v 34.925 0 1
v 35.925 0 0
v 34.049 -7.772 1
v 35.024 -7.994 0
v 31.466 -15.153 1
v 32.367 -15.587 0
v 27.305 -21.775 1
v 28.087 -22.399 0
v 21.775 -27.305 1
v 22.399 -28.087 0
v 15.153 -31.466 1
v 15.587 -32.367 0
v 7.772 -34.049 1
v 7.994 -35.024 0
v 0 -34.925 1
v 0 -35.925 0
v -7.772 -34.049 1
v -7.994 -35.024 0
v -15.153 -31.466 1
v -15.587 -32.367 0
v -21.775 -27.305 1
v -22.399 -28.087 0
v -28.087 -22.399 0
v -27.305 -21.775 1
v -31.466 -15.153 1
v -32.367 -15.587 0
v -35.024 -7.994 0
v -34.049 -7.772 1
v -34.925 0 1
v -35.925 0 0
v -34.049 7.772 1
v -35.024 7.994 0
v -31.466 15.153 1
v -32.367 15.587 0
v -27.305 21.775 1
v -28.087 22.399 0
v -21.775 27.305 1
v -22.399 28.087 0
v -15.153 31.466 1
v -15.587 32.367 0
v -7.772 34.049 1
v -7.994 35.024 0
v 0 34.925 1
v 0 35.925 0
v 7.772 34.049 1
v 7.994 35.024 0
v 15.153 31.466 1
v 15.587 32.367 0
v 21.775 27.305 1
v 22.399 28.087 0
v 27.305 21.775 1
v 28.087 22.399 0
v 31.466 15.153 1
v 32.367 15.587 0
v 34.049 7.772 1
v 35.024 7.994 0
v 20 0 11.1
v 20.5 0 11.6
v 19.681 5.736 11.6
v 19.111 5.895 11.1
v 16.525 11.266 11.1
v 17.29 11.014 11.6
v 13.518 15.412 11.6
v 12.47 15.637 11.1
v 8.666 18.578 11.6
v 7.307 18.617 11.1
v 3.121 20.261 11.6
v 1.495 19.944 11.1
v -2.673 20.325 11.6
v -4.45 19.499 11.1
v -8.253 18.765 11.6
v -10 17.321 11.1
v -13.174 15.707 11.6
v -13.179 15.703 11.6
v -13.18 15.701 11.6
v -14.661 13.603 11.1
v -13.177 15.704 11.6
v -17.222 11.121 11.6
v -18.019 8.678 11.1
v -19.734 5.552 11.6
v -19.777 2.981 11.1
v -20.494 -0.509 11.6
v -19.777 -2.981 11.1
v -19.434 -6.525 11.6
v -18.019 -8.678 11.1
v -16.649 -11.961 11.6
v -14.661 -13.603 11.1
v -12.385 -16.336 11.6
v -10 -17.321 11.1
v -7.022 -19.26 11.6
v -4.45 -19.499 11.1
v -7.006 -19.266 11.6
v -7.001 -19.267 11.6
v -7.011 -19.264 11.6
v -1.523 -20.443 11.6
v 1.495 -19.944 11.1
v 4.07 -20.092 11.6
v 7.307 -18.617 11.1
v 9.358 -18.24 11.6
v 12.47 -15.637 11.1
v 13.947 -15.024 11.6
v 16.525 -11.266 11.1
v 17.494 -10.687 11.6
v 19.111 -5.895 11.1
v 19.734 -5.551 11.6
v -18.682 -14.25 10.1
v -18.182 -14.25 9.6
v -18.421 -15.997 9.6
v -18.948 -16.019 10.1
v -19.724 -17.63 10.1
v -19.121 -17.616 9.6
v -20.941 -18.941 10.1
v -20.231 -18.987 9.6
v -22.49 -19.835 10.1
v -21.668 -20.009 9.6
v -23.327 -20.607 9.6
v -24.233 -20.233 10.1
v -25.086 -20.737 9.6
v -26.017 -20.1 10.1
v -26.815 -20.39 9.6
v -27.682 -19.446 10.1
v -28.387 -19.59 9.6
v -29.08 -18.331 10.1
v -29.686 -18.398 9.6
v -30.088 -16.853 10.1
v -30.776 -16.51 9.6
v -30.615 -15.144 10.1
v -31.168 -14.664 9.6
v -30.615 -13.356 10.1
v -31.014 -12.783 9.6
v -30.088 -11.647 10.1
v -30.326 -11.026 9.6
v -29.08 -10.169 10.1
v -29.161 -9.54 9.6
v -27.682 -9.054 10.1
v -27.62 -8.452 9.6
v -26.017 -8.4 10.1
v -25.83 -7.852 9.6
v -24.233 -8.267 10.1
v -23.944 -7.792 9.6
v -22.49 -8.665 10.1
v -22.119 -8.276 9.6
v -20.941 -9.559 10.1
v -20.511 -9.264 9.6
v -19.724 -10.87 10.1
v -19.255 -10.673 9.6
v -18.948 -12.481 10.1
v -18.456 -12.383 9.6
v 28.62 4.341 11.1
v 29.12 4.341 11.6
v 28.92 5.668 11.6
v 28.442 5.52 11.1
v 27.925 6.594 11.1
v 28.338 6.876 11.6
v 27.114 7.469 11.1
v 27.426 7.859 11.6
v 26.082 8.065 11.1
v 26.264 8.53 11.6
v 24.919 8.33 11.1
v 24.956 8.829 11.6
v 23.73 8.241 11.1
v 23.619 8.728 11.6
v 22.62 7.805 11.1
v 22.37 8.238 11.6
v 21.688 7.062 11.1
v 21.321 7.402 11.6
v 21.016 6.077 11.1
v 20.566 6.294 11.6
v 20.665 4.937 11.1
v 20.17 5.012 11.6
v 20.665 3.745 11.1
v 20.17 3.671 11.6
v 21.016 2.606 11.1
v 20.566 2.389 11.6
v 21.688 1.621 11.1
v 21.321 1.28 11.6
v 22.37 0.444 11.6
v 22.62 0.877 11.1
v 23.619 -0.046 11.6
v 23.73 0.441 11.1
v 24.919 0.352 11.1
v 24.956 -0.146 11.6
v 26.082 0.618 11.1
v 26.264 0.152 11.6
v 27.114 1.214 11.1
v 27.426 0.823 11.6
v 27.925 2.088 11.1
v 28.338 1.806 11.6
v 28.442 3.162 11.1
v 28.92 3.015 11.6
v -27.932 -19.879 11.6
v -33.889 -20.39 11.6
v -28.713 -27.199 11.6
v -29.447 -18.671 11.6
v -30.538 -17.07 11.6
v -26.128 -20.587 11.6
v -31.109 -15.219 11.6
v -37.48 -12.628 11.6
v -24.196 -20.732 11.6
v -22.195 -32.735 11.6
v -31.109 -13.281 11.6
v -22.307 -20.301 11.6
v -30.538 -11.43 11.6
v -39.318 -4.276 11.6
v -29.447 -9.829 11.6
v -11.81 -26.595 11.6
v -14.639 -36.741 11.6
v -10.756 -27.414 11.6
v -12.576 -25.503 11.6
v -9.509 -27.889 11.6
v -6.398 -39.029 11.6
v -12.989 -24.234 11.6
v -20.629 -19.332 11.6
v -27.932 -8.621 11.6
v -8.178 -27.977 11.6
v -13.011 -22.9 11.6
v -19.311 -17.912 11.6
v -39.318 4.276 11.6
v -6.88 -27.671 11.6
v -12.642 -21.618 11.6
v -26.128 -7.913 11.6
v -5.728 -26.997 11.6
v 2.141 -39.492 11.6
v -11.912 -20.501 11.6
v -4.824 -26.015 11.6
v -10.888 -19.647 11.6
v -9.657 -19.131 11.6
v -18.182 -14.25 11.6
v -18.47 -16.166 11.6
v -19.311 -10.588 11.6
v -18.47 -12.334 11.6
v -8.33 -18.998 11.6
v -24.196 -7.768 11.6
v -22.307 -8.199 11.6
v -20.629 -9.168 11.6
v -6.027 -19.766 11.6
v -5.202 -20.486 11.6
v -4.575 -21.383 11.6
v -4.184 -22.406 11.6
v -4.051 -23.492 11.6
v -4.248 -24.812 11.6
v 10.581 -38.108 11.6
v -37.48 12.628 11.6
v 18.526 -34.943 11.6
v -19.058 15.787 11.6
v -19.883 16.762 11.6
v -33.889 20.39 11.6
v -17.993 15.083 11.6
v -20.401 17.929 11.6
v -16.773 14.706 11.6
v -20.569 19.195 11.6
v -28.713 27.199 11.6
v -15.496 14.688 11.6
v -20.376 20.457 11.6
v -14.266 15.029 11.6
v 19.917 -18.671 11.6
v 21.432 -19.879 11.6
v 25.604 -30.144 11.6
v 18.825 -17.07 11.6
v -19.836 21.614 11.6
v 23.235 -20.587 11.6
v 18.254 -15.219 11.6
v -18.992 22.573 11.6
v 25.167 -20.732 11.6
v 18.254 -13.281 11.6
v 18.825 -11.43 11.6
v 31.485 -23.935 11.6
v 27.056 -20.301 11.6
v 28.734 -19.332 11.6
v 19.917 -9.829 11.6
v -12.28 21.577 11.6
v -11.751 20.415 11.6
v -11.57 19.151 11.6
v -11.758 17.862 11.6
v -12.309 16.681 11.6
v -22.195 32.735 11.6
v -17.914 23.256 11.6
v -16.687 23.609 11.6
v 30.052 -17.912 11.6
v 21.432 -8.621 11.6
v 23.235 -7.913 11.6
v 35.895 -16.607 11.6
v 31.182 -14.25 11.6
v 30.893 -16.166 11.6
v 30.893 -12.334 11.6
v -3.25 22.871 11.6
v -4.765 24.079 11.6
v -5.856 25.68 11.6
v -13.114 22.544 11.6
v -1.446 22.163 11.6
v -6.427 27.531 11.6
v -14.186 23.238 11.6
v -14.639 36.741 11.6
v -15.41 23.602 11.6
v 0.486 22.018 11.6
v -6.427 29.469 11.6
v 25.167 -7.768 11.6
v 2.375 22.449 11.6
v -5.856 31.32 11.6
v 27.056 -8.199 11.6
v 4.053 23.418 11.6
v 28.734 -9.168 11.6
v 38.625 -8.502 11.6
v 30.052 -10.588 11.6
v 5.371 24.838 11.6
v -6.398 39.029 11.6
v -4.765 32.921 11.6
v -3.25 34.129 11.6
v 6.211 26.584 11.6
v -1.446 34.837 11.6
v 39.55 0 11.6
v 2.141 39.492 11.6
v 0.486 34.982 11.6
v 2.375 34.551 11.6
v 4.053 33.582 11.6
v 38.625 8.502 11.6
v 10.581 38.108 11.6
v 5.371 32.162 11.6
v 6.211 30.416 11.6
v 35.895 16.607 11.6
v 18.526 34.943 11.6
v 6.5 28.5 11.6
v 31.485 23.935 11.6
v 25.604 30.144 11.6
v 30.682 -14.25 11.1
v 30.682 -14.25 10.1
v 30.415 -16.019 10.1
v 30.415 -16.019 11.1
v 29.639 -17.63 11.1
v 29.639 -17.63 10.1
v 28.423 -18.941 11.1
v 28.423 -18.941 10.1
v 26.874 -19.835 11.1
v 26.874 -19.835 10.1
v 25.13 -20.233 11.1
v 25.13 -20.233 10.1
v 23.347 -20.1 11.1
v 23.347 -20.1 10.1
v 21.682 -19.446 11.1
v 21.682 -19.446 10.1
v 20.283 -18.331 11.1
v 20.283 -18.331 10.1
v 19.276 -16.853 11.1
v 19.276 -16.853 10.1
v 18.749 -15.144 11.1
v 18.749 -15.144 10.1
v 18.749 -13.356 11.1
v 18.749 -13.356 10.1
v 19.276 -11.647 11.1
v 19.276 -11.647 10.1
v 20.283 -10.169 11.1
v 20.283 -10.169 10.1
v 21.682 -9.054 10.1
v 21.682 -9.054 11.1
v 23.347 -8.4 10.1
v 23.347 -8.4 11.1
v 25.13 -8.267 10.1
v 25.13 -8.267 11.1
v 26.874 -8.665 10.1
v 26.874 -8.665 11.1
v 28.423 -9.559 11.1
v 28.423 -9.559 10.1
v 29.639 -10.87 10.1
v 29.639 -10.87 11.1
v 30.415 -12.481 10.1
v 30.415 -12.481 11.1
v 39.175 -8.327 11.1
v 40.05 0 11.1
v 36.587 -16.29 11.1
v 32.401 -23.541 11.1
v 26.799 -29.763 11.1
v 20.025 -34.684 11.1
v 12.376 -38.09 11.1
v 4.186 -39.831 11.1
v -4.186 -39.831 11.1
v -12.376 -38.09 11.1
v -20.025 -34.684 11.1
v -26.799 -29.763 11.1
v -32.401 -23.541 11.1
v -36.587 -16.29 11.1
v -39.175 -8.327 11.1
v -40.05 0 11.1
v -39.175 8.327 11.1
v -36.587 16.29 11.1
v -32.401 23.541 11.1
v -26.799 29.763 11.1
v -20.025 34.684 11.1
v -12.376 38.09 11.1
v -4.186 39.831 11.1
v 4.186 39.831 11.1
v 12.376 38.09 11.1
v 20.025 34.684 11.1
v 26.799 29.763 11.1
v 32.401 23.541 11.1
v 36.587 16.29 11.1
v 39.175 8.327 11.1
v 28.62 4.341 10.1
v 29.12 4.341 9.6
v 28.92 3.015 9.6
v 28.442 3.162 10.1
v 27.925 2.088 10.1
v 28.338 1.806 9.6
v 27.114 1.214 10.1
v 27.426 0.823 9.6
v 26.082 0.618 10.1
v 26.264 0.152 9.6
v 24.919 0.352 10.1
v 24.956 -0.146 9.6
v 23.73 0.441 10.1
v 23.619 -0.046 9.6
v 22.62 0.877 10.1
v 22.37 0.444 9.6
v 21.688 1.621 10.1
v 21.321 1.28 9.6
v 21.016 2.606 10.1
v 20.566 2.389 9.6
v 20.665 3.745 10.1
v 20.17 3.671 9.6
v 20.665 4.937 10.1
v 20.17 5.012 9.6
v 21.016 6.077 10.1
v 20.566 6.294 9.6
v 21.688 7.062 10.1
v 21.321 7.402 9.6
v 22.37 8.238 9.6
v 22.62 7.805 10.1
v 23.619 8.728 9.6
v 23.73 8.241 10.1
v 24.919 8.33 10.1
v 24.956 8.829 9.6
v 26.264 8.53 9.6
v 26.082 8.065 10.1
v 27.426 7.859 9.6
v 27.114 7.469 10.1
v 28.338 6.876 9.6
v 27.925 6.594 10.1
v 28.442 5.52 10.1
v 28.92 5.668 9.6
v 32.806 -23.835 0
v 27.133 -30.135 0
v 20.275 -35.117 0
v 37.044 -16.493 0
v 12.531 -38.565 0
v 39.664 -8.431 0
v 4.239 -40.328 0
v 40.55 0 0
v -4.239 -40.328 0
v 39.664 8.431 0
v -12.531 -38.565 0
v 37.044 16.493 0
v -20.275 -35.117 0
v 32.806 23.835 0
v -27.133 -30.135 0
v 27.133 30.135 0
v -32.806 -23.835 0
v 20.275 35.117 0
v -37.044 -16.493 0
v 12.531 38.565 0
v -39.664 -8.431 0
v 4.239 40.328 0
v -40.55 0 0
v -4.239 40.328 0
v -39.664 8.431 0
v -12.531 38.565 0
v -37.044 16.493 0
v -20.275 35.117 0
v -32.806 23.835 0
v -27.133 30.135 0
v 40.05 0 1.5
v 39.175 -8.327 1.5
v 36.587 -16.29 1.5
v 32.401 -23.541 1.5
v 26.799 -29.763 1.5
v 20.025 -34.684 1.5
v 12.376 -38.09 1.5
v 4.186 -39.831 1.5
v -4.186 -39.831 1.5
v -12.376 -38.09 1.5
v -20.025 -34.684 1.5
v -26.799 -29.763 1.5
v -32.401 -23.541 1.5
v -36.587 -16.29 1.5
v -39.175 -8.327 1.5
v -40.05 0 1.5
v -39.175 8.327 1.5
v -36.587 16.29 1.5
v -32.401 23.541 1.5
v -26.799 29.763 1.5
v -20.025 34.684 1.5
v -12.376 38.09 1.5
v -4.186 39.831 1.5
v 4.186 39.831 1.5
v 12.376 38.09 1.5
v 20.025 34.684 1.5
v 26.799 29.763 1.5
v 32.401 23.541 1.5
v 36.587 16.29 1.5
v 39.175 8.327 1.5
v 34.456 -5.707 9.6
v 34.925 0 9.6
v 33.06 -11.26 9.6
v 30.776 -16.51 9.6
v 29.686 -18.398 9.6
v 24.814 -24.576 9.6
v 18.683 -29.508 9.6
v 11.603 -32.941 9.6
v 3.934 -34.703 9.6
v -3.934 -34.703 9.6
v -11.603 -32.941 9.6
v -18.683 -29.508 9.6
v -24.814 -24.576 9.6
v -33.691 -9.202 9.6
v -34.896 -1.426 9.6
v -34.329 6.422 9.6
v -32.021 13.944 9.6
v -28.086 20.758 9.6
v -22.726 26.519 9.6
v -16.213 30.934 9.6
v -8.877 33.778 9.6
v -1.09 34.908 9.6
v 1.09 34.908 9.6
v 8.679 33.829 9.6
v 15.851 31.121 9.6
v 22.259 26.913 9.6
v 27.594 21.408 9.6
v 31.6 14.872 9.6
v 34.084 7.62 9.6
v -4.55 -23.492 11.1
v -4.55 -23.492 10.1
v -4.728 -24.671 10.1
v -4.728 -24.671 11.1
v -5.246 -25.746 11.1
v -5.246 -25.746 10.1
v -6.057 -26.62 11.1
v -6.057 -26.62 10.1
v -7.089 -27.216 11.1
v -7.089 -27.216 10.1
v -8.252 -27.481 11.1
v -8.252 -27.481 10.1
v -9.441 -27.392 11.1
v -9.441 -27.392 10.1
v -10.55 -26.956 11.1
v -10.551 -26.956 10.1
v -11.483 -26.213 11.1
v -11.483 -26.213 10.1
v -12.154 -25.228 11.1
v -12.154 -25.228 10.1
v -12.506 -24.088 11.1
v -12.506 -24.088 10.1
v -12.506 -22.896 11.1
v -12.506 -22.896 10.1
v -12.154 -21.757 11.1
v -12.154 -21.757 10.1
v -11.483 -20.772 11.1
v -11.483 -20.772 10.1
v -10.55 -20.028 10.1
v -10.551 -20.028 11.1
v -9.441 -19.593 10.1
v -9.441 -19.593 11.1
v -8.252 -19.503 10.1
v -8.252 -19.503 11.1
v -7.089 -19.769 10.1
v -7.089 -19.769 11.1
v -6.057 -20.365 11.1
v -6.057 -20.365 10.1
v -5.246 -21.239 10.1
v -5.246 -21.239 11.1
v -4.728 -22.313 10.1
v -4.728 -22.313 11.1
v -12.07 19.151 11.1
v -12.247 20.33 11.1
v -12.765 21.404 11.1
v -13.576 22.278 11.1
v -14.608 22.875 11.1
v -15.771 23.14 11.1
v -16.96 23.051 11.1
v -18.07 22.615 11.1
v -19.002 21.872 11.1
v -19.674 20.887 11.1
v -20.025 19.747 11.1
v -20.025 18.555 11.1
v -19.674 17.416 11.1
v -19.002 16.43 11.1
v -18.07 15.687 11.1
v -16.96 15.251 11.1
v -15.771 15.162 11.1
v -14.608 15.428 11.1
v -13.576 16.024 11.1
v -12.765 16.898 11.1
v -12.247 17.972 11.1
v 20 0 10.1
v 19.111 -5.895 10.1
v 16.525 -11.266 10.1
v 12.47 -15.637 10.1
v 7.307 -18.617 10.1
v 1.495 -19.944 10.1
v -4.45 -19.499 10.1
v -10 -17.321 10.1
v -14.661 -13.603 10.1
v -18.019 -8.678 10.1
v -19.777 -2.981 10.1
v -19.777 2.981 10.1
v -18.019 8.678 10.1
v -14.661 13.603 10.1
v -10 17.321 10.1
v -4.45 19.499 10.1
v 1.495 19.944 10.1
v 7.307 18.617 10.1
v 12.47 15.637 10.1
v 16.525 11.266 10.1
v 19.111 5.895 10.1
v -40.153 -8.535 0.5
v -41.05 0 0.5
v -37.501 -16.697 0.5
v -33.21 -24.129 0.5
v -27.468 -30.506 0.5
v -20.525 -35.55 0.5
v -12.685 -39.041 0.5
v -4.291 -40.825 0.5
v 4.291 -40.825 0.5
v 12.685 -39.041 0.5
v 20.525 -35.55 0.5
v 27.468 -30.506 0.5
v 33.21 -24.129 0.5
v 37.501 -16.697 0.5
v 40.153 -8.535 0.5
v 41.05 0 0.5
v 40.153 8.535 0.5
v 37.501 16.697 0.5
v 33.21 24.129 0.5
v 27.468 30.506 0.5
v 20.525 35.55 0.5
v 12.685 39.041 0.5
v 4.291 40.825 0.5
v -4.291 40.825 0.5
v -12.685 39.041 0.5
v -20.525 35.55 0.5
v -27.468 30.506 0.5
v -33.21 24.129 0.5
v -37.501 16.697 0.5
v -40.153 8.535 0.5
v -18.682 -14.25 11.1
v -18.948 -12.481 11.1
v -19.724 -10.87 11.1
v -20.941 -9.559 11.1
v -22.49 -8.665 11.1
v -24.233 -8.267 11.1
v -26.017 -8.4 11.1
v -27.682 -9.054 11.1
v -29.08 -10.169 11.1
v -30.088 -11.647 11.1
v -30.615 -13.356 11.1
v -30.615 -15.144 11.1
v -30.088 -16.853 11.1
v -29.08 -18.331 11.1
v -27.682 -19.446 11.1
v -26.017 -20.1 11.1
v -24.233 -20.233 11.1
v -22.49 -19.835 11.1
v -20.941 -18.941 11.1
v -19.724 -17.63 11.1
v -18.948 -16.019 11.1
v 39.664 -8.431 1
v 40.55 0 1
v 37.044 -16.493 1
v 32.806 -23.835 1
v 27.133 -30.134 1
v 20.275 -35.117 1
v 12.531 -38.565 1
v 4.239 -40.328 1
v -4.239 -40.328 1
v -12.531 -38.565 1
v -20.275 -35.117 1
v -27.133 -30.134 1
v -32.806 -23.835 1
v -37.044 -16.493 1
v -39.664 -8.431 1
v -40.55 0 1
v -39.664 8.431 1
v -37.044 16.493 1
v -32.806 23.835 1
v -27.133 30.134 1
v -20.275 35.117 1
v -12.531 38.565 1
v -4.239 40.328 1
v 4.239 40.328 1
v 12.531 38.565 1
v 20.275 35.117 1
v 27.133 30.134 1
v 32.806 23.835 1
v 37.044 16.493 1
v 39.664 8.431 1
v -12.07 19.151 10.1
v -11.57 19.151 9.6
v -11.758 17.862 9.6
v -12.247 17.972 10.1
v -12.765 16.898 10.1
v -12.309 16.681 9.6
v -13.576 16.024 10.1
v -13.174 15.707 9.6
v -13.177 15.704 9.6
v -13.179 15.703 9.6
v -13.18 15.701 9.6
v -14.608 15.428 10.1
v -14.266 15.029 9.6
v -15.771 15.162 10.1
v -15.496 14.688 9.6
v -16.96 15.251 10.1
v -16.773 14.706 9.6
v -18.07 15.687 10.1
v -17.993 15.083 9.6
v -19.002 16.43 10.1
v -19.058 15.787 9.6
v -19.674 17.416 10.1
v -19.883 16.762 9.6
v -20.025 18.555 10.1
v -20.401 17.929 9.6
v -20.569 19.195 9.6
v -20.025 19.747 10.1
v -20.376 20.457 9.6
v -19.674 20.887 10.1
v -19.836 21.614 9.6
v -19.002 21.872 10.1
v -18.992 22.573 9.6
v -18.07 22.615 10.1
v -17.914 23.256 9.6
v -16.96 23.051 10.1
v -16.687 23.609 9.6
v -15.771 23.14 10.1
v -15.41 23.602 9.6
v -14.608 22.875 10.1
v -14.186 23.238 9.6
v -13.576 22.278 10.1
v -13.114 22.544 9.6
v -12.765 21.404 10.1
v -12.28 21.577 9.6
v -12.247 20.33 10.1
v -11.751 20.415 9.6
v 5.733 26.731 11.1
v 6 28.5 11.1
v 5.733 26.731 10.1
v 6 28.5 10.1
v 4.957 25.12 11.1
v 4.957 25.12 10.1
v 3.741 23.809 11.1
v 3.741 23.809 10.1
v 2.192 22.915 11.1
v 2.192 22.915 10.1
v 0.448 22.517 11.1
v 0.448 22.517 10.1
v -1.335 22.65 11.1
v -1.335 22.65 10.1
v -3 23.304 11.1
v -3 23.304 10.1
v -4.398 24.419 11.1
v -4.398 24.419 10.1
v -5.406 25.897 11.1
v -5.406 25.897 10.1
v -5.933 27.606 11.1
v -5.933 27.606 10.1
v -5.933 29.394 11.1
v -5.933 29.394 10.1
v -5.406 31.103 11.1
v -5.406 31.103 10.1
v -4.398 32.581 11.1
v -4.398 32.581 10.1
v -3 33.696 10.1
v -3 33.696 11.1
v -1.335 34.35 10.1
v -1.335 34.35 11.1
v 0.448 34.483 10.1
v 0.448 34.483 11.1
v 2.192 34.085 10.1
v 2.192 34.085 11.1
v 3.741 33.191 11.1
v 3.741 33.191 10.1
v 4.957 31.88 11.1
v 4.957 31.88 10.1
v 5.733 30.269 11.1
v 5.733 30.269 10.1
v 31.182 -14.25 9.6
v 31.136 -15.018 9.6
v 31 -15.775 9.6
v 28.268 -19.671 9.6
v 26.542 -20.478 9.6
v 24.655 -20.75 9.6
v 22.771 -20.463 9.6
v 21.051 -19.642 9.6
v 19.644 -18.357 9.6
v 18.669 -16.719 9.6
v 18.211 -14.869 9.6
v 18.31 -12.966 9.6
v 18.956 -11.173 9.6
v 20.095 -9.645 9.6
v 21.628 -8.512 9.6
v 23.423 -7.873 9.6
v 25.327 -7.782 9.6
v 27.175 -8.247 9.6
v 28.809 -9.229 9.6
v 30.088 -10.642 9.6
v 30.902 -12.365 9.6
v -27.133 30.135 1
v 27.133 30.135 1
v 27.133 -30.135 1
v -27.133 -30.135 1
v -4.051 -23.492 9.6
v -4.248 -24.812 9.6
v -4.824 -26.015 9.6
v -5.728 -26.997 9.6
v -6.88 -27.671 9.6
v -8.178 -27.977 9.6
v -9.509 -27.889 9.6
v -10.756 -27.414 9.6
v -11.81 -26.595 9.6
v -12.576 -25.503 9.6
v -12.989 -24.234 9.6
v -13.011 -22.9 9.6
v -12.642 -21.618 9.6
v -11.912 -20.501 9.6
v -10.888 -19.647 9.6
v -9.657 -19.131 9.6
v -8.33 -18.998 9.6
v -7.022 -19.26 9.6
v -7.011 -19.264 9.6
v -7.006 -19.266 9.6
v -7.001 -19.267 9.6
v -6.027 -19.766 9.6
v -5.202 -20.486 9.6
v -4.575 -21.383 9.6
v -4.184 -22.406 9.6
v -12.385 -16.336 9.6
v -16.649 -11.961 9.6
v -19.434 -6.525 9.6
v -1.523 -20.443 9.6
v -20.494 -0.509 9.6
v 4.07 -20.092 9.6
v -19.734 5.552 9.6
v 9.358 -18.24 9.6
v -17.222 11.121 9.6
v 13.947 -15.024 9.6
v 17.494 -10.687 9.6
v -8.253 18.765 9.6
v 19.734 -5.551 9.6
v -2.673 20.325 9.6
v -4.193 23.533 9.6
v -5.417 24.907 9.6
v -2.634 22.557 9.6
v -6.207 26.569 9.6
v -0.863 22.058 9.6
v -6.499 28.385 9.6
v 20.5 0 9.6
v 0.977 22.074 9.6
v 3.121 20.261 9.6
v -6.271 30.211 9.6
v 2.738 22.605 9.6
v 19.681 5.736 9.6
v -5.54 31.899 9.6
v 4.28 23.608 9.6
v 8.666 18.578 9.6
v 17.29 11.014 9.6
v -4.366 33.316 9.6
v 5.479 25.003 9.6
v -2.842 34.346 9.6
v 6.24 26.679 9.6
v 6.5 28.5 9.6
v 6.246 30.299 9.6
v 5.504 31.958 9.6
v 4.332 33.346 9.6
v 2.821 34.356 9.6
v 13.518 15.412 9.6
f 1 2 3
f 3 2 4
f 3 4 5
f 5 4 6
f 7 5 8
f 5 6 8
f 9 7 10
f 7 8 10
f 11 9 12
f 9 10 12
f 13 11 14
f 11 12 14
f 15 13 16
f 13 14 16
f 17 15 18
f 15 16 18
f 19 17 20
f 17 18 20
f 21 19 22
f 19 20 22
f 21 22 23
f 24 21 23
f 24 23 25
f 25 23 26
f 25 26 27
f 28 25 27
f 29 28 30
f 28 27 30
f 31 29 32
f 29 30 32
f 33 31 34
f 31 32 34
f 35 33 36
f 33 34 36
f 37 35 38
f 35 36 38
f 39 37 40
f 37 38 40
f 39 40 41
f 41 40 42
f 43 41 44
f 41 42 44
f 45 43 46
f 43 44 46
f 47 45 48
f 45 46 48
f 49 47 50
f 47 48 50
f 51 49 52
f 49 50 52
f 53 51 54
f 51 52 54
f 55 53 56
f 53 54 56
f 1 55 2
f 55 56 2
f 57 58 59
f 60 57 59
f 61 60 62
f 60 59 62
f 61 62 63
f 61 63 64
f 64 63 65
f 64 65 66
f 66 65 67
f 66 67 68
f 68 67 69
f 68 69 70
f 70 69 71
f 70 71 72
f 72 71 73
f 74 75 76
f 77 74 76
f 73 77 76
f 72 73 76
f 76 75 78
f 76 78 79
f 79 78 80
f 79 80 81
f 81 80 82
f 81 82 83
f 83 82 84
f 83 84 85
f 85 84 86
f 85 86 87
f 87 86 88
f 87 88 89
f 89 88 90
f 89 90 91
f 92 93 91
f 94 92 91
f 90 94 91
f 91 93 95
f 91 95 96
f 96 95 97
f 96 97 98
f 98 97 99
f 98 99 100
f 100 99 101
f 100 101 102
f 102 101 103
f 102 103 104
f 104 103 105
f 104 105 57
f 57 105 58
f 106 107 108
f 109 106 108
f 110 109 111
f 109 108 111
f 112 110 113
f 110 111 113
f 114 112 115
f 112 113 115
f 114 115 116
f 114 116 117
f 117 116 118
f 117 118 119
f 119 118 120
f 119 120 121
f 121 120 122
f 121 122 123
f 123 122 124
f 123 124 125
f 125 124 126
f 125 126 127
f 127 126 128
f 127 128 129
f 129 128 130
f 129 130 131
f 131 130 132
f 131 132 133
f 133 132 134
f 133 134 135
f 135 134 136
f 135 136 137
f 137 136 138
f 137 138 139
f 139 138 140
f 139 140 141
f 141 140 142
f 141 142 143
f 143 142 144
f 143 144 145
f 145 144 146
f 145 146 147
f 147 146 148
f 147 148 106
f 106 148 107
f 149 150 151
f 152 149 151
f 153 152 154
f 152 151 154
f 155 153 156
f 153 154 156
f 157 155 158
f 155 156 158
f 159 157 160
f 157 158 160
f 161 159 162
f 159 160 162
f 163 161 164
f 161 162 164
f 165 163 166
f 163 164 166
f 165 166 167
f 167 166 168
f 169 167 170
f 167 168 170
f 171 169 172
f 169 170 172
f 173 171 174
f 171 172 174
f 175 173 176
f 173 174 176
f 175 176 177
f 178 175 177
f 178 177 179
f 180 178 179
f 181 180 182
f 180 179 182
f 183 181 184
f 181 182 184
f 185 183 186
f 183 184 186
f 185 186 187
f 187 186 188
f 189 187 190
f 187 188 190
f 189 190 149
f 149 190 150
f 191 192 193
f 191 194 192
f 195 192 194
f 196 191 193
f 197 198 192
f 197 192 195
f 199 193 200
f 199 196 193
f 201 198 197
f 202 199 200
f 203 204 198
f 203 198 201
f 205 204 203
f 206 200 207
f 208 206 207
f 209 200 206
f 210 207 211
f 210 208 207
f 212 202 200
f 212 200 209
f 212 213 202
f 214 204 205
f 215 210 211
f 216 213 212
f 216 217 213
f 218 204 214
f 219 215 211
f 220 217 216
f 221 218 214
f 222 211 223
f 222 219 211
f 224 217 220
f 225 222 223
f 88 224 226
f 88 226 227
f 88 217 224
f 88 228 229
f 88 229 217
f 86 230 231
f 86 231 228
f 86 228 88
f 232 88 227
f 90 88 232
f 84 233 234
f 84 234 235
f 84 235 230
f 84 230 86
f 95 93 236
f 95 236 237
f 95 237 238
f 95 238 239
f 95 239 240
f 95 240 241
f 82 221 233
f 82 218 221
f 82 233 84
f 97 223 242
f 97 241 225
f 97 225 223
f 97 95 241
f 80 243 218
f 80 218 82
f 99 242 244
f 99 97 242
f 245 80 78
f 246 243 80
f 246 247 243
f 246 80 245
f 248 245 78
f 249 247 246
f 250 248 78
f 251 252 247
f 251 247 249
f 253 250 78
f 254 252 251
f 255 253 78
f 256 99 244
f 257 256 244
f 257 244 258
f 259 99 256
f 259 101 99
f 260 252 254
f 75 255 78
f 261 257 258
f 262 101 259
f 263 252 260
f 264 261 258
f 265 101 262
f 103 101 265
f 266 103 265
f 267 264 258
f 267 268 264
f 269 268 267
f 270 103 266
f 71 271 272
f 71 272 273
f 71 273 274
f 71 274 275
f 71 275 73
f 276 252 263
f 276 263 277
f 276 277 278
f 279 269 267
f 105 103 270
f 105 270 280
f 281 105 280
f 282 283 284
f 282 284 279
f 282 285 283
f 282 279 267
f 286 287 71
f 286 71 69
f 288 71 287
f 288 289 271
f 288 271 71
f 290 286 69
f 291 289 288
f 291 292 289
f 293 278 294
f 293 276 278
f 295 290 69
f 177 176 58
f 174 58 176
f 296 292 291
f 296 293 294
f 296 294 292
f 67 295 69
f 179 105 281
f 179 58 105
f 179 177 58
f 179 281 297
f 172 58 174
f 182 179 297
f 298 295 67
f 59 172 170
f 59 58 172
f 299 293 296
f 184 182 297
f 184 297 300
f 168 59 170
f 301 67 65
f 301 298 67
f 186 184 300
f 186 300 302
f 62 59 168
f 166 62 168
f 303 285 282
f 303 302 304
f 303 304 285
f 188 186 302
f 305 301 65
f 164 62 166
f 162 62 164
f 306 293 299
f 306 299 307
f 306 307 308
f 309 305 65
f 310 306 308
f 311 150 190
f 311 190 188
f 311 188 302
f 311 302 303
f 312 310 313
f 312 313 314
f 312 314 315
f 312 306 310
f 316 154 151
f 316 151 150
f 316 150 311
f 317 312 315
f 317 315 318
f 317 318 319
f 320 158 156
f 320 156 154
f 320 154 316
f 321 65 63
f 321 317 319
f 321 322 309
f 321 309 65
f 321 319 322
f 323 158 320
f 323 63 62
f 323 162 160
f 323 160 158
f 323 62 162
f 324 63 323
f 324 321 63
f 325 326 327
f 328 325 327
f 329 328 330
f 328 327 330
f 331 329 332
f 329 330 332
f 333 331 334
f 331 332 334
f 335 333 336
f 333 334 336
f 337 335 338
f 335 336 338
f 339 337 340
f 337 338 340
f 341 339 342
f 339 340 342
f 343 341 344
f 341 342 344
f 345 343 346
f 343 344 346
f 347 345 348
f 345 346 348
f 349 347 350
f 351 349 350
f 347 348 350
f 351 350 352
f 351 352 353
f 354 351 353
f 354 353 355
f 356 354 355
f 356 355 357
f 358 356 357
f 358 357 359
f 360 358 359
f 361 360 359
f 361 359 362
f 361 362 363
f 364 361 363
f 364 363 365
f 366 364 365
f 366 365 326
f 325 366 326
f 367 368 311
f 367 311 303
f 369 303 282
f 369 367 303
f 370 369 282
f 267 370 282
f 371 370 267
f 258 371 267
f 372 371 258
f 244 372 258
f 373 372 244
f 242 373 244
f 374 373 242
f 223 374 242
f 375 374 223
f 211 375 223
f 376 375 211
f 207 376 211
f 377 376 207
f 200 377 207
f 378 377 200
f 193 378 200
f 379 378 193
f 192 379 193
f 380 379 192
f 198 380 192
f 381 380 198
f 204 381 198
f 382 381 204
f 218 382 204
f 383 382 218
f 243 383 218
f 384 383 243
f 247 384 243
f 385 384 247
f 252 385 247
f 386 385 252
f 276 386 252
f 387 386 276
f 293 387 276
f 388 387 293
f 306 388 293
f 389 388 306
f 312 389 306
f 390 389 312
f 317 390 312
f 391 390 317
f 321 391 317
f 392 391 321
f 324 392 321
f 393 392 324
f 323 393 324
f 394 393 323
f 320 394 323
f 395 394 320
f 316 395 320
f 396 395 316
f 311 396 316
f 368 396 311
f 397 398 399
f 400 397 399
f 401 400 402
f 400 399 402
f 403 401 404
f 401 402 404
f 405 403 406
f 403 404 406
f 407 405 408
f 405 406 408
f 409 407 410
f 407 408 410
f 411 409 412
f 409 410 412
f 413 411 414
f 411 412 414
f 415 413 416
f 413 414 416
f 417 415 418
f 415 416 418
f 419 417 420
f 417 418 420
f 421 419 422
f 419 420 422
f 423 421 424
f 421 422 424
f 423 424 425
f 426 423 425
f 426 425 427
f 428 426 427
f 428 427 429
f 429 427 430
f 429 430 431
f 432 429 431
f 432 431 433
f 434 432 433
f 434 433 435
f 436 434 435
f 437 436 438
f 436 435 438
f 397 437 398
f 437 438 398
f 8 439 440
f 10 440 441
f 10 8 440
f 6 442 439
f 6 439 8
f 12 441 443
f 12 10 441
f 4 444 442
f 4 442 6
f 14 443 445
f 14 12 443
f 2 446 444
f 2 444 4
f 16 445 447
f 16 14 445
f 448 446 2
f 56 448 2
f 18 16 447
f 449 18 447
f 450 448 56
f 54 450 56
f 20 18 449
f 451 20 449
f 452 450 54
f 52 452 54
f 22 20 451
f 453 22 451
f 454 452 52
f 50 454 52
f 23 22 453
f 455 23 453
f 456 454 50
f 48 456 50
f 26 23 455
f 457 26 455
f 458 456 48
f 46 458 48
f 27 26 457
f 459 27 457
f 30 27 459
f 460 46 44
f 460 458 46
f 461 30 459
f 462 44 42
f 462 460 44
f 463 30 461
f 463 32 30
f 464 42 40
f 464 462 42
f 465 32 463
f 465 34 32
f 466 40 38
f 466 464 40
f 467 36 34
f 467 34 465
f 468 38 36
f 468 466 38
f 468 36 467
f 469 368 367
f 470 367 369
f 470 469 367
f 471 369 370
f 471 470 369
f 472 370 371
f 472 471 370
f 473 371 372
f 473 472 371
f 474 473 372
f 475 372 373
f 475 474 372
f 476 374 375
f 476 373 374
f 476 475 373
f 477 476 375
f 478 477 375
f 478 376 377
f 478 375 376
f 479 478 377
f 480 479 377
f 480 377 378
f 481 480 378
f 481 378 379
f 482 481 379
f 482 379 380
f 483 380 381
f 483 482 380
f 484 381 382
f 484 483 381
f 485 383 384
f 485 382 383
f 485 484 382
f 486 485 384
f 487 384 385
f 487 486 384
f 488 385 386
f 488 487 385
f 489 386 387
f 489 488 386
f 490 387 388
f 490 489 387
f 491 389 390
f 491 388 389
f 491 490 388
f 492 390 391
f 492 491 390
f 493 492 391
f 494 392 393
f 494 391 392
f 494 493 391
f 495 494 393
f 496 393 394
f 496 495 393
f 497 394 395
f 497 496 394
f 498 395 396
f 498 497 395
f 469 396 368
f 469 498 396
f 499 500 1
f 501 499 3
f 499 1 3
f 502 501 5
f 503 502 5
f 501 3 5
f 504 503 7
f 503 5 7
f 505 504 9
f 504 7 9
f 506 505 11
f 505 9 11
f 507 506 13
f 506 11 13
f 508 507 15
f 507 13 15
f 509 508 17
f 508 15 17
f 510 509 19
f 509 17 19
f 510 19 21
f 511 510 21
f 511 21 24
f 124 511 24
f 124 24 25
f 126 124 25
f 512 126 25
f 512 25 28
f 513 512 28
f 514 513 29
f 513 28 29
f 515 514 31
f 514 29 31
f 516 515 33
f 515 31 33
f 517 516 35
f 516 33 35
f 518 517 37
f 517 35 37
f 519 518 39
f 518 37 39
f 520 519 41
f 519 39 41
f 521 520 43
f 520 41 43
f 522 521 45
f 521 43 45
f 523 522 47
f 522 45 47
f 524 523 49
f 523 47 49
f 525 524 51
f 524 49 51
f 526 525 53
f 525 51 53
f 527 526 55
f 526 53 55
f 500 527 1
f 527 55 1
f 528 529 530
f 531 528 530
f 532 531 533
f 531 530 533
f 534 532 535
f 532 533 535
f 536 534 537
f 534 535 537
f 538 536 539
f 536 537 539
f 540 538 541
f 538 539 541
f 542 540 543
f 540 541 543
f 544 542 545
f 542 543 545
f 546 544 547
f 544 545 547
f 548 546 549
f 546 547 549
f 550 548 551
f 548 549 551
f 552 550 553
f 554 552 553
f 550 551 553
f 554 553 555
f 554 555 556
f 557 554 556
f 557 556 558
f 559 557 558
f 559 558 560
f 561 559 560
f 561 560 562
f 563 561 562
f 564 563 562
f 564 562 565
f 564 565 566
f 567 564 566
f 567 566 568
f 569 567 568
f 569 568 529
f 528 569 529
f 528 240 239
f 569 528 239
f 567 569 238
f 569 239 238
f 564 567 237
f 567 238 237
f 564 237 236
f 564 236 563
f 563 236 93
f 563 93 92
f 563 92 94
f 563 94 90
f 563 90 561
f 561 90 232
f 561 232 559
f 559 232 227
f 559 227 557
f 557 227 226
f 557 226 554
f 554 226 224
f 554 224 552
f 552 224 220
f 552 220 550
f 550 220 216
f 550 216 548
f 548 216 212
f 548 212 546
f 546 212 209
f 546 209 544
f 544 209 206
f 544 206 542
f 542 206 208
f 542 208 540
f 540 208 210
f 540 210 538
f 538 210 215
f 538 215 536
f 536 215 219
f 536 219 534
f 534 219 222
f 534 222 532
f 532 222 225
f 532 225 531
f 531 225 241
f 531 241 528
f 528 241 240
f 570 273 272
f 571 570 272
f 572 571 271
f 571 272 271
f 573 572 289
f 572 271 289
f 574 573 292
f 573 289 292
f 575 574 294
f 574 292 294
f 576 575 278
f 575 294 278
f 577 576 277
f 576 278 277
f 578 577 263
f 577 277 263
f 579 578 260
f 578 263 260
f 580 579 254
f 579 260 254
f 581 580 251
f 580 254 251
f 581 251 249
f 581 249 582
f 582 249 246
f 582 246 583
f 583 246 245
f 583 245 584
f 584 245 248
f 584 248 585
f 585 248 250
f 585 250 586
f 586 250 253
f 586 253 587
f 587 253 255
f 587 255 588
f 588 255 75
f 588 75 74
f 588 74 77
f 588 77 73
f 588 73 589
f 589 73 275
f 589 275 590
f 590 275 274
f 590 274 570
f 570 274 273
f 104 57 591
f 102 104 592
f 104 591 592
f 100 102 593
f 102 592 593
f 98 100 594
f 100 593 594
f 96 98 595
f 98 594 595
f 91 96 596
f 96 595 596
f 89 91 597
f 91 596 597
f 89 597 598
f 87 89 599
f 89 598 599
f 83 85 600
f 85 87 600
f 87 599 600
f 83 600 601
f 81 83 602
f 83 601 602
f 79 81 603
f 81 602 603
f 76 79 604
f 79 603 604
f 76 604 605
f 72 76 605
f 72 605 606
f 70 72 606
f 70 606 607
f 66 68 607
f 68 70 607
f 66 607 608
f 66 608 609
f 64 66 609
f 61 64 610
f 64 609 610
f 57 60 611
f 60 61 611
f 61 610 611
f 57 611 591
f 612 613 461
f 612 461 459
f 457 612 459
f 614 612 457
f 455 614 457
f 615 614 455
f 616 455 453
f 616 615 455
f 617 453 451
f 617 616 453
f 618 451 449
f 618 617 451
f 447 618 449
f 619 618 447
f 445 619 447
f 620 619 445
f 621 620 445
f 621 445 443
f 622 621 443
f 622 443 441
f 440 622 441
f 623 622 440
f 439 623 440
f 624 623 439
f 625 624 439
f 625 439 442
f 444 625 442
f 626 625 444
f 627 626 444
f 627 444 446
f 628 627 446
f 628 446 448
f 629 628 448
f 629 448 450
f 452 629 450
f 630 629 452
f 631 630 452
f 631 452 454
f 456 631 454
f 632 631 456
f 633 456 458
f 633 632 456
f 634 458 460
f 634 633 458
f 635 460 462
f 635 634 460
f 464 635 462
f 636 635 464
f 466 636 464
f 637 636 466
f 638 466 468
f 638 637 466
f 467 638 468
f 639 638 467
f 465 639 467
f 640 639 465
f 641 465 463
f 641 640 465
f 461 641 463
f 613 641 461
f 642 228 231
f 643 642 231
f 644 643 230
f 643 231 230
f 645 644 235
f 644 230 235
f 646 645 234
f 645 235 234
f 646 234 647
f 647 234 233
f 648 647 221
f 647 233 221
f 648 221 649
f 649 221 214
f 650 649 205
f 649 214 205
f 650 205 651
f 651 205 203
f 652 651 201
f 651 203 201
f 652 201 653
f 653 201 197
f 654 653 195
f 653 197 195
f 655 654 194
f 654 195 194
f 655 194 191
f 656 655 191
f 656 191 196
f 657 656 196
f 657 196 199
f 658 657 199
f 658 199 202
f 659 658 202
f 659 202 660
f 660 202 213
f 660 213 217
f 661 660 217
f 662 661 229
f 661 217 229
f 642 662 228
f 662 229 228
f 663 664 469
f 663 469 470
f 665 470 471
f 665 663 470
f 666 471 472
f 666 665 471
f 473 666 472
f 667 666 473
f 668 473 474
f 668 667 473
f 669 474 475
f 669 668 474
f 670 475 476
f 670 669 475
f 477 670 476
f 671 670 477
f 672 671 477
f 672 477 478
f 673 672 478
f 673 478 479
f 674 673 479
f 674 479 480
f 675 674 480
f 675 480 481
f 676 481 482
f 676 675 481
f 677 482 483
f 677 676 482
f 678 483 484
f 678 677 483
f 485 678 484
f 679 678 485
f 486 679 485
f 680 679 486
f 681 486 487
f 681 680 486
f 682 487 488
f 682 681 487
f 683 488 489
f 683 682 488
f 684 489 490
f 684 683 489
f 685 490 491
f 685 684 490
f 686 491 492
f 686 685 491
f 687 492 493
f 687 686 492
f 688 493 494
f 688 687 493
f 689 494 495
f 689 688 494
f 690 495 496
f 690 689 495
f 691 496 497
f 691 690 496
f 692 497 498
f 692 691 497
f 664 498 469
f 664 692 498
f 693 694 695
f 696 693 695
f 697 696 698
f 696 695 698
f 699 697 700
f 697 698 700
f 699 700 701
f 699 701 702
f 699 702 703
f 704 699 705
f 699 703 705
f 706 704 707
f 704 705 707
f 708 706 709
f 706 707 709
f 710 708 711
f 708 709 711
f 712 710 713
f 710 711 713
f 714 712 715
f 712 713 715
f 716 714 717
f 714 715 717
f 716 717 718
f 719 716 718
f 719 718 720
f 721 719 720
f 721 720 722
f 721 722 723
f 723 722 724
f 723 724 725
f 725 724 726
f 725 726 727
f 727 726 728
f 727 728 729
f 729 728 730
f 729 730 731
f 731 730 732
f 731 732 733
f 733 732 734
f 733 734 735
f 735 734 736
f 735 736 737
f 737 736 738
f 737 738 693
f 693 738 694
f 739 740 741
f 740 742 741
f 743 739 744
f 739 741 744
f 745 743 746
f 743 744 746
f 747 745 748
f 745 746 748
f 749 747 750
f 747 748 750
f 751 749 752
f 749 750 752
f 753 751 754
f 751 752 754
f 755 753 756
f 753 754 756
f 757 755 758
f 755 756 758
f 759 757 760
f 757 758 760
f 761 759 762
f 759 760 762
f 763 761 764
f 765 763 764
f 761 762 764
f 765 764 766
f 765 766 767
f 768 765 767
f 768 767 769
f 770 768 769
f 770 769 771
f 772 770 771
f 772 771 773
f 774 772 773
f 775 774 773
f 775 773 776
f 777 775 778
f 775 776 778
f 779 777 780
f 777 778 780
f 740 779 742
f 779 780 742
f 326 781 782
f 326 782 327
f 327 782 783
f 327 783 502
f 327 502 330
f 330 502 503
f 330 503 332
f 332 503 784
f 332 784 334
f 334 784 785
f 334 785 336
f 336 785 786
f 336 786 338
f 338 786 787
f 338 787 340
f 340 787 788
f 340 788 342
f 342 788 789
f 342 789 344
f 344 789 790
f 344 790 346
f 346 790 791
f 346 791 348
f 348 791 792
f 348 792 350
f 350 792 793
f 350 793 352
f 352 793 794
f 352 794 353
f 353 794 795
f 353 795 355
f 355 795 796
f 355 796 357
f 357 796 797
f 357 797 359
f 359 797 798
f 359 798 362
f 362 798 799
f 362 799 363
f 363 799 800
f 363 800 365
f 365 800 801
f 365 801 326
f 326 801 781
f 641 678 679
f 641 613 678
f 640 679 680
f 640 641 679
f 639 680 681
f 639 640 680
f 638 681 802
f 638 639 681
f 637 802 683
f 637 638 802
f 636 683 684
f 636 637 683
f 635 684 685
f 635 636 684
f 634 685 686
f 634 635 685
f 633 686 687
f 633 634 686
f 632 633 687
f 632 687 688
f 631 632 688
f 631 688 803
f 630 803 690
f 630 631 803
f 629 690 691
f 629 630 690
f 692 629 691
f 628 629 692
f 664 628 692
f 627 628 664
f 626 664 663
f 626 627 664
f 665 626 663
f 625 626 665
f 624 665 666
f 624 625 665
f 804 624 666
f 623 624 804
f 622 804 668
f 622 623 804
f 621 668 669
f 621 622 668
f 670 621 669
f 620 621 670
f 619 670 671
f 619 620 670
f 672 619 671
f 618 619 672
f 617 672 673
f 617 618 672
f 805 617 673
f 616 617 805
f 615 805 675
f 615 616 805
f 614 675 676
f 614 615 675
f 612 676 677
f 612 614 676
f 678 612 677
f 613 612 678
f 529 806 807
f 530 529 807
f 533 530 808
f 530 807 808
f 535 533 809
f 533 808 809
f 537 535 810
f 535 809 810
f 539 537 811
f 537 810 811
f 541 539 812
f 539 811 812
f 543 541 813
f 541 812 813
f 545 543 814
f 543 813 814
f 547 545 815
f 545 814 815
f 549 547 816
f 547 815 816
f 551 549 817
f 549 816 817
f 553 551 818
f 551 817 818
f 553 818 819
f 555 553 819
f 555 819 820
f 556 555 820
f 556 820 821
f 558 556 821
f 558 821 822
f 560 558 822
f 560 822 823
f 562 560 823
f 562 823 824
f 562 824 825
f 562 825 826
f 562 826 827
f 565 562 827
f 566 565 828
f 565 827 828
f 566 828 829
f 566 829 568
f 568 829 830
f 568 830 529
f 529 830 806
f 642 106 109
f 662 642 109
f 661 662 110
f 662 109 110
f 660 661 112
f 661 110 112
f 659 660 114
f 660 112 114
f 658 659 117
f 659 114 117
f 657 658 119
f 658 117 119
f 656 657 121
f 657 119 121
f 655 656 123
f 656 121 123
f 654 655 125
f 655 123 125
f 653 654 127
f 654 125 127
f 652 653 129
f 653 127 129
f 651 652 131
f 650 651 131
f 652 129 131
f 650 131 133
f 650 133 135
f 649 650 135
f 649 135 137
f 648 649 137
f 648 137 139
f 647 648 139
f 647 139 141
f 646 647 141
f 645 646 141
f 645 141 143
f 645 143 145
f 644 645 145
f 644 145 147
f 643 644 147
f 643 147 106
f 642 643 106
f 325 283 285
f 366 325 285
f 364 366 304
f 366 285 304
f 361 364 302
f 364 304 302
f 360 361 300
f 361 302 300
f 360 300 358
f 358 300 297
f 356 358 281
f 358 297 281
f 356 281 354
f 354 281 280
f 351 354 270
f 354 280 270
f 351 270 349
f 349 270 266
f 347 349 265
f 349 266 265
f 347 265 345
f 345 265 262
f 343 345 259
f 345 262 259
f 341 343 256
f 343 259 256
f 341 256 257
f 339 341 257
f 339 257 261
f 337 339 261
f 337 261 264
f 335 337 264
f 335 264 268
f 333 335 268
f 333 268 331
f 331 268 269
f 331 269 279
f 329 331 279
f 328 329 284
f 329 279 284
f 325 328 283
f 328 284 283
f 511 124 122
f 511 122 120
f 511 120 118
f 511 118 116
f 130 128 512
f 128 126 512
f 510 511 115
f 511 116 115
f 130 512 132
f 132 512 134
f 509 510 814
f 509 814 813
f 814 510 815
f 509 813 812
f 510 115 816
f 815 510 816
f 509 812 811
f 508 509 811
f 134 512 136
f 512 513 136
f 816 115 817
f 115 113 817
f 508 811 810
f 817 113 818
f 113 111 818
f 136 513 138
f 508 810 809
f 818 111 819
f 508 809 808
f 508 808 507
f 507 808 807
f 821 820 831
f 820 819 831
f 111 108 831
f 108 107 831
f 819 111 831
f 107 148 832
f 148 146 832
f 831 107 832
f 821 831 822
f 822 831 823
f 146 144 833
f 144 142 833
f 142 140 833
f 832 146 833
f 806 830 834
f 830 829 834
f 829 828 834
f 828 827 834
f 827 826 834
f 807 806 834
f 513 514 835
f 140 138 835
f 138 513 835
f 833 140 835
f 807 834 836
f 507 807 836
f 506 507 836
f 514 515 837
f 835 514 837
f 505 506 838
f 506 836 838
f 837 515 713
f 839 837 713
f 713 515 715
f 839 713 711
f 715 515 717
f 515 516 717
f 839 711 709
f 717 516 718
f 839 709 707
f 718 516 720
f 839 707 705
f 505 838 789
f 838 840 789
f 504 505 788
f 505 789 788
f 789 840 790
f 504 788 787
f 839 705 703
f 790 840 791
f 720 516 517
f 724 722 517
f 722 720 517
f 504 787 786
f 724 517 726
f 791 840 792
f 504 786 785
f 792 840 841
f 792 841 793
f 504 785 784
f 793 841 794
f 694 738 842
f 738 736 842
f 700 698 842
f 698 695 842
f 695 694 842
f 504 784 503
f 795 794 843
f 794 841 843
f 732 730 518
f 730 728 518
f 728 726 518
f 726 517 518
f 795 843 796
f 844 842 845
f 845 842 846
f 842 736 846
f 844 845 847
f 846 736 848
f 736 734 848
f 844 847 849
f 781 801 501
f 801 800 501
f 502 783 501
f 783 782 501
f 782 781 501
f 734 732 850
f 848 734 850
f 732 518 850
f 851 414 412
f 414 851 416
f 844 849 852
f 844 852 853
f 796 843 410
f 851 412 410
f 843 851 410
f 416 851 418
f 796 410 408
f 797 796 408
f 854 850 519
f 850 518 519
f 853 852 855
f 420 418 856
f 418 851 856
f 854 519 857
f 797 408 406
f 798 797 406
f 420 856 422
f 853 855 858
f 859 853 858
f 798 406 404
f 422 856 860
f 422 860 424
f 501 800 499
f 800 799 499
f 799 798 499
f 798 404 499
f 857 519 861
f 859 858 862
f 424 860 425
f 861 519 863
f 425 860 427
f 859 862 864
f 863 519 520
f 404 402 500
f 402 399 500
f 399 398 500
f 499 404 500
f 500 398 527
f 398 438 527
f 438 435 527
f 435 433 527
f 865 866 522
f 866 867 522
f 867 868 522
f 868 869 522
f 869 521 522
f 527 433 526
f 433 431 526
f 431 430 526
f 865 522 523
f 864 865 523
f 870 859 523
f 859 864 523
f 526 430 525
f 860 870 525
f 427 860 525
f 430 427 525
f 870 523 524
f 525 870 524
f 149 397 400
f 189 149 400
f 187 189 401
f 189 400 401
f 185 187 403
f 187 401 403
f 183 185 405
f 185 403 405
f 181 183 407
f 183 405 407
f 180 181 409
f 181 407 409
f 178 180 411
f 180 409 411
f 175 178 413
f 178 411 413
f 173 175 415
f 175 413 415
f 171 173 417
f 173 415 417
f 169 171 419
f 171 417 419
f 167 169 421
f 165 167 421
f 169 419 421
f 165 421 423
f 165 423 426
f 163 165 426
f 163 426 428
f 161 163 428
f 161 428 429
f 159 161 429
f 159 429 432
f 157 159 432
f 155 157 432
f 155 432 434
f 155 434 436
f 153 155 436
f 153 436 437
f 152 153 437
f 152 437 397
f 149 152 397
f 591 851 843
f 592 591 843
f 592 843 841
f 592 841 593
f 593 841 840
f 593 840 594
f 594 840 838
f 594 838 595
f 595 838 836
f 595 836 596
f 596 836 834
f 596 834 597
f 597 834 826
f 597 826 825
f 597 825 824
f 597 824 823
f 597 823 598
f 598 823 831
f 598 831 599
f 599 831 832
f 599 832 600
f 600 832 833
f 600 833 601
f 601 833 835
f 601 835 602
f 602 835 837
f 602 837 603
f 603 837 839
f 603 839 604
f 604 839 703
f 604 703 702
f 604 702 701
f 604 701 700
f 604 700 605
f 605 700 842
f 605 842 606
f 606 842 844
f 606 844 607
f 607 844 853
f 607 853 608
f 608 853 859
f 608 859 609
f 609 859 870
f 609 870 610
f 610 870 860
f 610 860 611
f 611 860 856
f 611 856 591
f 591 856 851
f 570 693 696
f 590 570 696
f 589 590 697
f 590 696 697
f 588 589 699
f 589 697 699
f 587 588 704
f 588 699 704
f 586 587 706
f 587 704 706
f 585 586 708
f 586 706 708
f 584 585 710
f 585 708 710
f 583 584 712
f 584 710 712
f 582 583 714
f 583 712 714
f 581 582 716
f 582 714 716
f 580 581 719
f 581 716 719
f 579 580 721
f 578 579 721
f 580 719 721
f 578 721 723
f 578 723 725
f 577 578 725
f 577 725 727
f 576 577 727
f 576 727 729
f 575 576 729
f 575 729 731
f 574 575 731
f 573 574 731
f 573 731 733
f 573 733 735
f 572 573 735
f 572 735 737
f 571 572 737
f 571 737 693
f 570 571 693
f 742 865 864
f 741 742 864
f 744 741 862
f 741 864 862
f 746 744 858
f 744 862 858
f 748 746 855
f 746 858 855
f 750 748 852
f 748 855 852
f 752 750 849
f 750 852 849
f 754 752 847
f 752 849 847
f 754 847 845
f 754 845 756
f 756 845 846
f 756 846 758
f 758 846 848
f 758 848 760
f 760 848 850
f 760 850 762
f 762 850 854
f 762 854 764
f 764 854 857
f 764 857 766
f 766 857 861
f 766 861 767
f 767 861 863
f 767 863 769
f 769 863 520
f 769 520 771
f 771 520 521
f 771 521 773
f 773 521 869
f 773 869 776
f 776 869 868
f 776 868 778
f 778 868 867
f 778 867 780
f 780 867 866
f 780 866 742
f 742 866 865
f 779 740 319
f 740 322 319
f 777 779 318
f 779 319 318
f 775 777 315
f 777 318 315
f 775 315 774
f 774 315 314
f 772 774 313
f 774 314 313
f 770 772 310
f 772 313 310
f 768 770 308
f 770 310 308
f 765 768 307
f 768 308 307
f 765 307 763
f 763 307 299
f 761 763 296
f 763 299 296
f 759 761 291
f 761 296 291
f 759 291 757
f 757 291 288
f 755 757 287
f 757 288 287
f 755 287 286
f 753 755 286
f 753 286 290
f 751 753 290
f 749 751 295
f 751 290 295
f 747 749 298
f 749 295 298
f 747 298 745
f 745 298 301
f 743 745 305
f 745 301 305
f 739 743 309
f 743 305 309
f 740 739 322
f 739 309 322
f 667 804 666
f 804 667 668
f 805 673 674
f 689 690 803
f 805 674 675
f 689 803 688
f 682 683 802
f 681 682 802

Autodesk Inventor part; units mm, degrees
ref_plane "YZ Plane" through (0, 0, 0) normal (1, 0, 0) x (0, 1, 0)
ref_plane "XZ Plane" through (0, 0, 0) normal (0, 1, 0) x (-1, 0, 0)
ref_plane "XY Plane" through (0, 0, 0) normal (0, 0, 1) x (1, 0, 0)
sketch "Sketch1" plane through (0, 0, 0) normal (0, 0, 1) x (1, 0, 0)
  circle A0 centre (0, 0) radius 40.05
  circle A1 centre (0, 0) radius 34.925
  dimension "d0" = 80.1
  dimension "d1" = 69.85
extrude "Extrusion1" add sketch "Sketch1" along normal blind 9.6
sketch "Sketch2" plane through (0, 0, 9.6) normal (0, 0, 1) x (1, 0, 0)
  circle A0 centre (0, 0) radius 20
  circle A1 centre (0, 0) radius 40.05 projected
  line L0 (0, 0) -> (0, 61.5181)
  circle A2 centre (0, 0) radius 28.5
  circle A3 centre (0, 0) radius 25
  line L1 (0, 0) -> (-40.7696, 48.5873)
  circle A4 centre (0, 28.5) radius 6
  circle A5 centre (-16.0697, 19.1511) radius 4
  circle A6 centre (-24.6817, -14.25) radius 6
  circle A7 centre (-8.5505, -23.4923) radius 4
  circle A8 centre (24.6817, -14.25) radius 6
  circle A9 centre (24.6202, 4.3412) radius 4
  point P0 (21.1514, -19.1015)
  point P1 (28.352, 2.9011)
  point P2 (23.6127, 8.2122)
  point P3 (19.0171, -16.228)
  point P4 (24.9974, 0.359)
  point P5 (27.6344, 6.9708)
  point P6 (23.5624, -8.3553)
  point P7 (27.1181, -8.7669)
  dimension "d5" = 57
  dimension "d6" = 50
  dimension "d4" = 40
  dimension "d7" = 12
  dimension "d8" = 40
  dimension "d9" = 8
  dimension "d12" = 360
extrude "Extrusion2" add sketch "Sketch2" along normal blind 2 contours A0 L0 A4 A3 A9 A8 A7 A6 A5 L1 | A0 L1 A5 A3 A4 L0 | A3 A5 A2 A4 | A4 A2 A9 A3 | A3 A6 A2 A5 | A2 A5 L1 A1 L0 A4 | A4 L0 A1 L1 A5 A2 A6 A7 A8 A9 | A9 A2 A8 A3 | A3 A7 A2 A6 | A3 A8 A2 A7
sketch "Sketch3" plane through (0, 0, 0) normal (0, 0, -1) x (-1, 0, 0)
  circle A0 centre (0, 0) radius 40.05 projected
  circle A1 centre (0, 0) radius 41.05
  dimension "d16" = 1
extrude "Extrusion3" add sketch "Sketch3" against normal blind 1
chamfer "Chamfer1" distance 0.5 angle 45 2 edges at (-40.05, 0, 1) (41.05, 0, 1)
chamfer "Chamfer2" distance 1 angle 45 1 edges at (-34.925, 0, 0)
chamfer "Chamfer3" distance 0.5 angle 45 1 edges at (41.05, 0, 0)
chamfer "Chamfer4" distance 0.5 angle 45 15 edges at (-40.05, 0, 11.6) (-6, 28.5, 11.6) (-20.0697, 19.1511, 11.6) (18.6817, -14.25, 11.6) (20.6202, 4.3412, 11.6) (-30.6817, -14.25, 11.6) (-12.5505, -23.4923, 11.6) (-20, 0, 11.6) (-20, 0, 9.6) (-12.5505, -23.4923, 9.6) (-30.6817, -14.25, 9.6) (20.6202, 4.3412, 9.6) (18.6817, -14.25, 9.6) (-6, 28.5, 9.6) (-20.0697, 19.1511, 9.6)
properties part number "planet_bearing_spacer" material "PC/ABS Plastic"
